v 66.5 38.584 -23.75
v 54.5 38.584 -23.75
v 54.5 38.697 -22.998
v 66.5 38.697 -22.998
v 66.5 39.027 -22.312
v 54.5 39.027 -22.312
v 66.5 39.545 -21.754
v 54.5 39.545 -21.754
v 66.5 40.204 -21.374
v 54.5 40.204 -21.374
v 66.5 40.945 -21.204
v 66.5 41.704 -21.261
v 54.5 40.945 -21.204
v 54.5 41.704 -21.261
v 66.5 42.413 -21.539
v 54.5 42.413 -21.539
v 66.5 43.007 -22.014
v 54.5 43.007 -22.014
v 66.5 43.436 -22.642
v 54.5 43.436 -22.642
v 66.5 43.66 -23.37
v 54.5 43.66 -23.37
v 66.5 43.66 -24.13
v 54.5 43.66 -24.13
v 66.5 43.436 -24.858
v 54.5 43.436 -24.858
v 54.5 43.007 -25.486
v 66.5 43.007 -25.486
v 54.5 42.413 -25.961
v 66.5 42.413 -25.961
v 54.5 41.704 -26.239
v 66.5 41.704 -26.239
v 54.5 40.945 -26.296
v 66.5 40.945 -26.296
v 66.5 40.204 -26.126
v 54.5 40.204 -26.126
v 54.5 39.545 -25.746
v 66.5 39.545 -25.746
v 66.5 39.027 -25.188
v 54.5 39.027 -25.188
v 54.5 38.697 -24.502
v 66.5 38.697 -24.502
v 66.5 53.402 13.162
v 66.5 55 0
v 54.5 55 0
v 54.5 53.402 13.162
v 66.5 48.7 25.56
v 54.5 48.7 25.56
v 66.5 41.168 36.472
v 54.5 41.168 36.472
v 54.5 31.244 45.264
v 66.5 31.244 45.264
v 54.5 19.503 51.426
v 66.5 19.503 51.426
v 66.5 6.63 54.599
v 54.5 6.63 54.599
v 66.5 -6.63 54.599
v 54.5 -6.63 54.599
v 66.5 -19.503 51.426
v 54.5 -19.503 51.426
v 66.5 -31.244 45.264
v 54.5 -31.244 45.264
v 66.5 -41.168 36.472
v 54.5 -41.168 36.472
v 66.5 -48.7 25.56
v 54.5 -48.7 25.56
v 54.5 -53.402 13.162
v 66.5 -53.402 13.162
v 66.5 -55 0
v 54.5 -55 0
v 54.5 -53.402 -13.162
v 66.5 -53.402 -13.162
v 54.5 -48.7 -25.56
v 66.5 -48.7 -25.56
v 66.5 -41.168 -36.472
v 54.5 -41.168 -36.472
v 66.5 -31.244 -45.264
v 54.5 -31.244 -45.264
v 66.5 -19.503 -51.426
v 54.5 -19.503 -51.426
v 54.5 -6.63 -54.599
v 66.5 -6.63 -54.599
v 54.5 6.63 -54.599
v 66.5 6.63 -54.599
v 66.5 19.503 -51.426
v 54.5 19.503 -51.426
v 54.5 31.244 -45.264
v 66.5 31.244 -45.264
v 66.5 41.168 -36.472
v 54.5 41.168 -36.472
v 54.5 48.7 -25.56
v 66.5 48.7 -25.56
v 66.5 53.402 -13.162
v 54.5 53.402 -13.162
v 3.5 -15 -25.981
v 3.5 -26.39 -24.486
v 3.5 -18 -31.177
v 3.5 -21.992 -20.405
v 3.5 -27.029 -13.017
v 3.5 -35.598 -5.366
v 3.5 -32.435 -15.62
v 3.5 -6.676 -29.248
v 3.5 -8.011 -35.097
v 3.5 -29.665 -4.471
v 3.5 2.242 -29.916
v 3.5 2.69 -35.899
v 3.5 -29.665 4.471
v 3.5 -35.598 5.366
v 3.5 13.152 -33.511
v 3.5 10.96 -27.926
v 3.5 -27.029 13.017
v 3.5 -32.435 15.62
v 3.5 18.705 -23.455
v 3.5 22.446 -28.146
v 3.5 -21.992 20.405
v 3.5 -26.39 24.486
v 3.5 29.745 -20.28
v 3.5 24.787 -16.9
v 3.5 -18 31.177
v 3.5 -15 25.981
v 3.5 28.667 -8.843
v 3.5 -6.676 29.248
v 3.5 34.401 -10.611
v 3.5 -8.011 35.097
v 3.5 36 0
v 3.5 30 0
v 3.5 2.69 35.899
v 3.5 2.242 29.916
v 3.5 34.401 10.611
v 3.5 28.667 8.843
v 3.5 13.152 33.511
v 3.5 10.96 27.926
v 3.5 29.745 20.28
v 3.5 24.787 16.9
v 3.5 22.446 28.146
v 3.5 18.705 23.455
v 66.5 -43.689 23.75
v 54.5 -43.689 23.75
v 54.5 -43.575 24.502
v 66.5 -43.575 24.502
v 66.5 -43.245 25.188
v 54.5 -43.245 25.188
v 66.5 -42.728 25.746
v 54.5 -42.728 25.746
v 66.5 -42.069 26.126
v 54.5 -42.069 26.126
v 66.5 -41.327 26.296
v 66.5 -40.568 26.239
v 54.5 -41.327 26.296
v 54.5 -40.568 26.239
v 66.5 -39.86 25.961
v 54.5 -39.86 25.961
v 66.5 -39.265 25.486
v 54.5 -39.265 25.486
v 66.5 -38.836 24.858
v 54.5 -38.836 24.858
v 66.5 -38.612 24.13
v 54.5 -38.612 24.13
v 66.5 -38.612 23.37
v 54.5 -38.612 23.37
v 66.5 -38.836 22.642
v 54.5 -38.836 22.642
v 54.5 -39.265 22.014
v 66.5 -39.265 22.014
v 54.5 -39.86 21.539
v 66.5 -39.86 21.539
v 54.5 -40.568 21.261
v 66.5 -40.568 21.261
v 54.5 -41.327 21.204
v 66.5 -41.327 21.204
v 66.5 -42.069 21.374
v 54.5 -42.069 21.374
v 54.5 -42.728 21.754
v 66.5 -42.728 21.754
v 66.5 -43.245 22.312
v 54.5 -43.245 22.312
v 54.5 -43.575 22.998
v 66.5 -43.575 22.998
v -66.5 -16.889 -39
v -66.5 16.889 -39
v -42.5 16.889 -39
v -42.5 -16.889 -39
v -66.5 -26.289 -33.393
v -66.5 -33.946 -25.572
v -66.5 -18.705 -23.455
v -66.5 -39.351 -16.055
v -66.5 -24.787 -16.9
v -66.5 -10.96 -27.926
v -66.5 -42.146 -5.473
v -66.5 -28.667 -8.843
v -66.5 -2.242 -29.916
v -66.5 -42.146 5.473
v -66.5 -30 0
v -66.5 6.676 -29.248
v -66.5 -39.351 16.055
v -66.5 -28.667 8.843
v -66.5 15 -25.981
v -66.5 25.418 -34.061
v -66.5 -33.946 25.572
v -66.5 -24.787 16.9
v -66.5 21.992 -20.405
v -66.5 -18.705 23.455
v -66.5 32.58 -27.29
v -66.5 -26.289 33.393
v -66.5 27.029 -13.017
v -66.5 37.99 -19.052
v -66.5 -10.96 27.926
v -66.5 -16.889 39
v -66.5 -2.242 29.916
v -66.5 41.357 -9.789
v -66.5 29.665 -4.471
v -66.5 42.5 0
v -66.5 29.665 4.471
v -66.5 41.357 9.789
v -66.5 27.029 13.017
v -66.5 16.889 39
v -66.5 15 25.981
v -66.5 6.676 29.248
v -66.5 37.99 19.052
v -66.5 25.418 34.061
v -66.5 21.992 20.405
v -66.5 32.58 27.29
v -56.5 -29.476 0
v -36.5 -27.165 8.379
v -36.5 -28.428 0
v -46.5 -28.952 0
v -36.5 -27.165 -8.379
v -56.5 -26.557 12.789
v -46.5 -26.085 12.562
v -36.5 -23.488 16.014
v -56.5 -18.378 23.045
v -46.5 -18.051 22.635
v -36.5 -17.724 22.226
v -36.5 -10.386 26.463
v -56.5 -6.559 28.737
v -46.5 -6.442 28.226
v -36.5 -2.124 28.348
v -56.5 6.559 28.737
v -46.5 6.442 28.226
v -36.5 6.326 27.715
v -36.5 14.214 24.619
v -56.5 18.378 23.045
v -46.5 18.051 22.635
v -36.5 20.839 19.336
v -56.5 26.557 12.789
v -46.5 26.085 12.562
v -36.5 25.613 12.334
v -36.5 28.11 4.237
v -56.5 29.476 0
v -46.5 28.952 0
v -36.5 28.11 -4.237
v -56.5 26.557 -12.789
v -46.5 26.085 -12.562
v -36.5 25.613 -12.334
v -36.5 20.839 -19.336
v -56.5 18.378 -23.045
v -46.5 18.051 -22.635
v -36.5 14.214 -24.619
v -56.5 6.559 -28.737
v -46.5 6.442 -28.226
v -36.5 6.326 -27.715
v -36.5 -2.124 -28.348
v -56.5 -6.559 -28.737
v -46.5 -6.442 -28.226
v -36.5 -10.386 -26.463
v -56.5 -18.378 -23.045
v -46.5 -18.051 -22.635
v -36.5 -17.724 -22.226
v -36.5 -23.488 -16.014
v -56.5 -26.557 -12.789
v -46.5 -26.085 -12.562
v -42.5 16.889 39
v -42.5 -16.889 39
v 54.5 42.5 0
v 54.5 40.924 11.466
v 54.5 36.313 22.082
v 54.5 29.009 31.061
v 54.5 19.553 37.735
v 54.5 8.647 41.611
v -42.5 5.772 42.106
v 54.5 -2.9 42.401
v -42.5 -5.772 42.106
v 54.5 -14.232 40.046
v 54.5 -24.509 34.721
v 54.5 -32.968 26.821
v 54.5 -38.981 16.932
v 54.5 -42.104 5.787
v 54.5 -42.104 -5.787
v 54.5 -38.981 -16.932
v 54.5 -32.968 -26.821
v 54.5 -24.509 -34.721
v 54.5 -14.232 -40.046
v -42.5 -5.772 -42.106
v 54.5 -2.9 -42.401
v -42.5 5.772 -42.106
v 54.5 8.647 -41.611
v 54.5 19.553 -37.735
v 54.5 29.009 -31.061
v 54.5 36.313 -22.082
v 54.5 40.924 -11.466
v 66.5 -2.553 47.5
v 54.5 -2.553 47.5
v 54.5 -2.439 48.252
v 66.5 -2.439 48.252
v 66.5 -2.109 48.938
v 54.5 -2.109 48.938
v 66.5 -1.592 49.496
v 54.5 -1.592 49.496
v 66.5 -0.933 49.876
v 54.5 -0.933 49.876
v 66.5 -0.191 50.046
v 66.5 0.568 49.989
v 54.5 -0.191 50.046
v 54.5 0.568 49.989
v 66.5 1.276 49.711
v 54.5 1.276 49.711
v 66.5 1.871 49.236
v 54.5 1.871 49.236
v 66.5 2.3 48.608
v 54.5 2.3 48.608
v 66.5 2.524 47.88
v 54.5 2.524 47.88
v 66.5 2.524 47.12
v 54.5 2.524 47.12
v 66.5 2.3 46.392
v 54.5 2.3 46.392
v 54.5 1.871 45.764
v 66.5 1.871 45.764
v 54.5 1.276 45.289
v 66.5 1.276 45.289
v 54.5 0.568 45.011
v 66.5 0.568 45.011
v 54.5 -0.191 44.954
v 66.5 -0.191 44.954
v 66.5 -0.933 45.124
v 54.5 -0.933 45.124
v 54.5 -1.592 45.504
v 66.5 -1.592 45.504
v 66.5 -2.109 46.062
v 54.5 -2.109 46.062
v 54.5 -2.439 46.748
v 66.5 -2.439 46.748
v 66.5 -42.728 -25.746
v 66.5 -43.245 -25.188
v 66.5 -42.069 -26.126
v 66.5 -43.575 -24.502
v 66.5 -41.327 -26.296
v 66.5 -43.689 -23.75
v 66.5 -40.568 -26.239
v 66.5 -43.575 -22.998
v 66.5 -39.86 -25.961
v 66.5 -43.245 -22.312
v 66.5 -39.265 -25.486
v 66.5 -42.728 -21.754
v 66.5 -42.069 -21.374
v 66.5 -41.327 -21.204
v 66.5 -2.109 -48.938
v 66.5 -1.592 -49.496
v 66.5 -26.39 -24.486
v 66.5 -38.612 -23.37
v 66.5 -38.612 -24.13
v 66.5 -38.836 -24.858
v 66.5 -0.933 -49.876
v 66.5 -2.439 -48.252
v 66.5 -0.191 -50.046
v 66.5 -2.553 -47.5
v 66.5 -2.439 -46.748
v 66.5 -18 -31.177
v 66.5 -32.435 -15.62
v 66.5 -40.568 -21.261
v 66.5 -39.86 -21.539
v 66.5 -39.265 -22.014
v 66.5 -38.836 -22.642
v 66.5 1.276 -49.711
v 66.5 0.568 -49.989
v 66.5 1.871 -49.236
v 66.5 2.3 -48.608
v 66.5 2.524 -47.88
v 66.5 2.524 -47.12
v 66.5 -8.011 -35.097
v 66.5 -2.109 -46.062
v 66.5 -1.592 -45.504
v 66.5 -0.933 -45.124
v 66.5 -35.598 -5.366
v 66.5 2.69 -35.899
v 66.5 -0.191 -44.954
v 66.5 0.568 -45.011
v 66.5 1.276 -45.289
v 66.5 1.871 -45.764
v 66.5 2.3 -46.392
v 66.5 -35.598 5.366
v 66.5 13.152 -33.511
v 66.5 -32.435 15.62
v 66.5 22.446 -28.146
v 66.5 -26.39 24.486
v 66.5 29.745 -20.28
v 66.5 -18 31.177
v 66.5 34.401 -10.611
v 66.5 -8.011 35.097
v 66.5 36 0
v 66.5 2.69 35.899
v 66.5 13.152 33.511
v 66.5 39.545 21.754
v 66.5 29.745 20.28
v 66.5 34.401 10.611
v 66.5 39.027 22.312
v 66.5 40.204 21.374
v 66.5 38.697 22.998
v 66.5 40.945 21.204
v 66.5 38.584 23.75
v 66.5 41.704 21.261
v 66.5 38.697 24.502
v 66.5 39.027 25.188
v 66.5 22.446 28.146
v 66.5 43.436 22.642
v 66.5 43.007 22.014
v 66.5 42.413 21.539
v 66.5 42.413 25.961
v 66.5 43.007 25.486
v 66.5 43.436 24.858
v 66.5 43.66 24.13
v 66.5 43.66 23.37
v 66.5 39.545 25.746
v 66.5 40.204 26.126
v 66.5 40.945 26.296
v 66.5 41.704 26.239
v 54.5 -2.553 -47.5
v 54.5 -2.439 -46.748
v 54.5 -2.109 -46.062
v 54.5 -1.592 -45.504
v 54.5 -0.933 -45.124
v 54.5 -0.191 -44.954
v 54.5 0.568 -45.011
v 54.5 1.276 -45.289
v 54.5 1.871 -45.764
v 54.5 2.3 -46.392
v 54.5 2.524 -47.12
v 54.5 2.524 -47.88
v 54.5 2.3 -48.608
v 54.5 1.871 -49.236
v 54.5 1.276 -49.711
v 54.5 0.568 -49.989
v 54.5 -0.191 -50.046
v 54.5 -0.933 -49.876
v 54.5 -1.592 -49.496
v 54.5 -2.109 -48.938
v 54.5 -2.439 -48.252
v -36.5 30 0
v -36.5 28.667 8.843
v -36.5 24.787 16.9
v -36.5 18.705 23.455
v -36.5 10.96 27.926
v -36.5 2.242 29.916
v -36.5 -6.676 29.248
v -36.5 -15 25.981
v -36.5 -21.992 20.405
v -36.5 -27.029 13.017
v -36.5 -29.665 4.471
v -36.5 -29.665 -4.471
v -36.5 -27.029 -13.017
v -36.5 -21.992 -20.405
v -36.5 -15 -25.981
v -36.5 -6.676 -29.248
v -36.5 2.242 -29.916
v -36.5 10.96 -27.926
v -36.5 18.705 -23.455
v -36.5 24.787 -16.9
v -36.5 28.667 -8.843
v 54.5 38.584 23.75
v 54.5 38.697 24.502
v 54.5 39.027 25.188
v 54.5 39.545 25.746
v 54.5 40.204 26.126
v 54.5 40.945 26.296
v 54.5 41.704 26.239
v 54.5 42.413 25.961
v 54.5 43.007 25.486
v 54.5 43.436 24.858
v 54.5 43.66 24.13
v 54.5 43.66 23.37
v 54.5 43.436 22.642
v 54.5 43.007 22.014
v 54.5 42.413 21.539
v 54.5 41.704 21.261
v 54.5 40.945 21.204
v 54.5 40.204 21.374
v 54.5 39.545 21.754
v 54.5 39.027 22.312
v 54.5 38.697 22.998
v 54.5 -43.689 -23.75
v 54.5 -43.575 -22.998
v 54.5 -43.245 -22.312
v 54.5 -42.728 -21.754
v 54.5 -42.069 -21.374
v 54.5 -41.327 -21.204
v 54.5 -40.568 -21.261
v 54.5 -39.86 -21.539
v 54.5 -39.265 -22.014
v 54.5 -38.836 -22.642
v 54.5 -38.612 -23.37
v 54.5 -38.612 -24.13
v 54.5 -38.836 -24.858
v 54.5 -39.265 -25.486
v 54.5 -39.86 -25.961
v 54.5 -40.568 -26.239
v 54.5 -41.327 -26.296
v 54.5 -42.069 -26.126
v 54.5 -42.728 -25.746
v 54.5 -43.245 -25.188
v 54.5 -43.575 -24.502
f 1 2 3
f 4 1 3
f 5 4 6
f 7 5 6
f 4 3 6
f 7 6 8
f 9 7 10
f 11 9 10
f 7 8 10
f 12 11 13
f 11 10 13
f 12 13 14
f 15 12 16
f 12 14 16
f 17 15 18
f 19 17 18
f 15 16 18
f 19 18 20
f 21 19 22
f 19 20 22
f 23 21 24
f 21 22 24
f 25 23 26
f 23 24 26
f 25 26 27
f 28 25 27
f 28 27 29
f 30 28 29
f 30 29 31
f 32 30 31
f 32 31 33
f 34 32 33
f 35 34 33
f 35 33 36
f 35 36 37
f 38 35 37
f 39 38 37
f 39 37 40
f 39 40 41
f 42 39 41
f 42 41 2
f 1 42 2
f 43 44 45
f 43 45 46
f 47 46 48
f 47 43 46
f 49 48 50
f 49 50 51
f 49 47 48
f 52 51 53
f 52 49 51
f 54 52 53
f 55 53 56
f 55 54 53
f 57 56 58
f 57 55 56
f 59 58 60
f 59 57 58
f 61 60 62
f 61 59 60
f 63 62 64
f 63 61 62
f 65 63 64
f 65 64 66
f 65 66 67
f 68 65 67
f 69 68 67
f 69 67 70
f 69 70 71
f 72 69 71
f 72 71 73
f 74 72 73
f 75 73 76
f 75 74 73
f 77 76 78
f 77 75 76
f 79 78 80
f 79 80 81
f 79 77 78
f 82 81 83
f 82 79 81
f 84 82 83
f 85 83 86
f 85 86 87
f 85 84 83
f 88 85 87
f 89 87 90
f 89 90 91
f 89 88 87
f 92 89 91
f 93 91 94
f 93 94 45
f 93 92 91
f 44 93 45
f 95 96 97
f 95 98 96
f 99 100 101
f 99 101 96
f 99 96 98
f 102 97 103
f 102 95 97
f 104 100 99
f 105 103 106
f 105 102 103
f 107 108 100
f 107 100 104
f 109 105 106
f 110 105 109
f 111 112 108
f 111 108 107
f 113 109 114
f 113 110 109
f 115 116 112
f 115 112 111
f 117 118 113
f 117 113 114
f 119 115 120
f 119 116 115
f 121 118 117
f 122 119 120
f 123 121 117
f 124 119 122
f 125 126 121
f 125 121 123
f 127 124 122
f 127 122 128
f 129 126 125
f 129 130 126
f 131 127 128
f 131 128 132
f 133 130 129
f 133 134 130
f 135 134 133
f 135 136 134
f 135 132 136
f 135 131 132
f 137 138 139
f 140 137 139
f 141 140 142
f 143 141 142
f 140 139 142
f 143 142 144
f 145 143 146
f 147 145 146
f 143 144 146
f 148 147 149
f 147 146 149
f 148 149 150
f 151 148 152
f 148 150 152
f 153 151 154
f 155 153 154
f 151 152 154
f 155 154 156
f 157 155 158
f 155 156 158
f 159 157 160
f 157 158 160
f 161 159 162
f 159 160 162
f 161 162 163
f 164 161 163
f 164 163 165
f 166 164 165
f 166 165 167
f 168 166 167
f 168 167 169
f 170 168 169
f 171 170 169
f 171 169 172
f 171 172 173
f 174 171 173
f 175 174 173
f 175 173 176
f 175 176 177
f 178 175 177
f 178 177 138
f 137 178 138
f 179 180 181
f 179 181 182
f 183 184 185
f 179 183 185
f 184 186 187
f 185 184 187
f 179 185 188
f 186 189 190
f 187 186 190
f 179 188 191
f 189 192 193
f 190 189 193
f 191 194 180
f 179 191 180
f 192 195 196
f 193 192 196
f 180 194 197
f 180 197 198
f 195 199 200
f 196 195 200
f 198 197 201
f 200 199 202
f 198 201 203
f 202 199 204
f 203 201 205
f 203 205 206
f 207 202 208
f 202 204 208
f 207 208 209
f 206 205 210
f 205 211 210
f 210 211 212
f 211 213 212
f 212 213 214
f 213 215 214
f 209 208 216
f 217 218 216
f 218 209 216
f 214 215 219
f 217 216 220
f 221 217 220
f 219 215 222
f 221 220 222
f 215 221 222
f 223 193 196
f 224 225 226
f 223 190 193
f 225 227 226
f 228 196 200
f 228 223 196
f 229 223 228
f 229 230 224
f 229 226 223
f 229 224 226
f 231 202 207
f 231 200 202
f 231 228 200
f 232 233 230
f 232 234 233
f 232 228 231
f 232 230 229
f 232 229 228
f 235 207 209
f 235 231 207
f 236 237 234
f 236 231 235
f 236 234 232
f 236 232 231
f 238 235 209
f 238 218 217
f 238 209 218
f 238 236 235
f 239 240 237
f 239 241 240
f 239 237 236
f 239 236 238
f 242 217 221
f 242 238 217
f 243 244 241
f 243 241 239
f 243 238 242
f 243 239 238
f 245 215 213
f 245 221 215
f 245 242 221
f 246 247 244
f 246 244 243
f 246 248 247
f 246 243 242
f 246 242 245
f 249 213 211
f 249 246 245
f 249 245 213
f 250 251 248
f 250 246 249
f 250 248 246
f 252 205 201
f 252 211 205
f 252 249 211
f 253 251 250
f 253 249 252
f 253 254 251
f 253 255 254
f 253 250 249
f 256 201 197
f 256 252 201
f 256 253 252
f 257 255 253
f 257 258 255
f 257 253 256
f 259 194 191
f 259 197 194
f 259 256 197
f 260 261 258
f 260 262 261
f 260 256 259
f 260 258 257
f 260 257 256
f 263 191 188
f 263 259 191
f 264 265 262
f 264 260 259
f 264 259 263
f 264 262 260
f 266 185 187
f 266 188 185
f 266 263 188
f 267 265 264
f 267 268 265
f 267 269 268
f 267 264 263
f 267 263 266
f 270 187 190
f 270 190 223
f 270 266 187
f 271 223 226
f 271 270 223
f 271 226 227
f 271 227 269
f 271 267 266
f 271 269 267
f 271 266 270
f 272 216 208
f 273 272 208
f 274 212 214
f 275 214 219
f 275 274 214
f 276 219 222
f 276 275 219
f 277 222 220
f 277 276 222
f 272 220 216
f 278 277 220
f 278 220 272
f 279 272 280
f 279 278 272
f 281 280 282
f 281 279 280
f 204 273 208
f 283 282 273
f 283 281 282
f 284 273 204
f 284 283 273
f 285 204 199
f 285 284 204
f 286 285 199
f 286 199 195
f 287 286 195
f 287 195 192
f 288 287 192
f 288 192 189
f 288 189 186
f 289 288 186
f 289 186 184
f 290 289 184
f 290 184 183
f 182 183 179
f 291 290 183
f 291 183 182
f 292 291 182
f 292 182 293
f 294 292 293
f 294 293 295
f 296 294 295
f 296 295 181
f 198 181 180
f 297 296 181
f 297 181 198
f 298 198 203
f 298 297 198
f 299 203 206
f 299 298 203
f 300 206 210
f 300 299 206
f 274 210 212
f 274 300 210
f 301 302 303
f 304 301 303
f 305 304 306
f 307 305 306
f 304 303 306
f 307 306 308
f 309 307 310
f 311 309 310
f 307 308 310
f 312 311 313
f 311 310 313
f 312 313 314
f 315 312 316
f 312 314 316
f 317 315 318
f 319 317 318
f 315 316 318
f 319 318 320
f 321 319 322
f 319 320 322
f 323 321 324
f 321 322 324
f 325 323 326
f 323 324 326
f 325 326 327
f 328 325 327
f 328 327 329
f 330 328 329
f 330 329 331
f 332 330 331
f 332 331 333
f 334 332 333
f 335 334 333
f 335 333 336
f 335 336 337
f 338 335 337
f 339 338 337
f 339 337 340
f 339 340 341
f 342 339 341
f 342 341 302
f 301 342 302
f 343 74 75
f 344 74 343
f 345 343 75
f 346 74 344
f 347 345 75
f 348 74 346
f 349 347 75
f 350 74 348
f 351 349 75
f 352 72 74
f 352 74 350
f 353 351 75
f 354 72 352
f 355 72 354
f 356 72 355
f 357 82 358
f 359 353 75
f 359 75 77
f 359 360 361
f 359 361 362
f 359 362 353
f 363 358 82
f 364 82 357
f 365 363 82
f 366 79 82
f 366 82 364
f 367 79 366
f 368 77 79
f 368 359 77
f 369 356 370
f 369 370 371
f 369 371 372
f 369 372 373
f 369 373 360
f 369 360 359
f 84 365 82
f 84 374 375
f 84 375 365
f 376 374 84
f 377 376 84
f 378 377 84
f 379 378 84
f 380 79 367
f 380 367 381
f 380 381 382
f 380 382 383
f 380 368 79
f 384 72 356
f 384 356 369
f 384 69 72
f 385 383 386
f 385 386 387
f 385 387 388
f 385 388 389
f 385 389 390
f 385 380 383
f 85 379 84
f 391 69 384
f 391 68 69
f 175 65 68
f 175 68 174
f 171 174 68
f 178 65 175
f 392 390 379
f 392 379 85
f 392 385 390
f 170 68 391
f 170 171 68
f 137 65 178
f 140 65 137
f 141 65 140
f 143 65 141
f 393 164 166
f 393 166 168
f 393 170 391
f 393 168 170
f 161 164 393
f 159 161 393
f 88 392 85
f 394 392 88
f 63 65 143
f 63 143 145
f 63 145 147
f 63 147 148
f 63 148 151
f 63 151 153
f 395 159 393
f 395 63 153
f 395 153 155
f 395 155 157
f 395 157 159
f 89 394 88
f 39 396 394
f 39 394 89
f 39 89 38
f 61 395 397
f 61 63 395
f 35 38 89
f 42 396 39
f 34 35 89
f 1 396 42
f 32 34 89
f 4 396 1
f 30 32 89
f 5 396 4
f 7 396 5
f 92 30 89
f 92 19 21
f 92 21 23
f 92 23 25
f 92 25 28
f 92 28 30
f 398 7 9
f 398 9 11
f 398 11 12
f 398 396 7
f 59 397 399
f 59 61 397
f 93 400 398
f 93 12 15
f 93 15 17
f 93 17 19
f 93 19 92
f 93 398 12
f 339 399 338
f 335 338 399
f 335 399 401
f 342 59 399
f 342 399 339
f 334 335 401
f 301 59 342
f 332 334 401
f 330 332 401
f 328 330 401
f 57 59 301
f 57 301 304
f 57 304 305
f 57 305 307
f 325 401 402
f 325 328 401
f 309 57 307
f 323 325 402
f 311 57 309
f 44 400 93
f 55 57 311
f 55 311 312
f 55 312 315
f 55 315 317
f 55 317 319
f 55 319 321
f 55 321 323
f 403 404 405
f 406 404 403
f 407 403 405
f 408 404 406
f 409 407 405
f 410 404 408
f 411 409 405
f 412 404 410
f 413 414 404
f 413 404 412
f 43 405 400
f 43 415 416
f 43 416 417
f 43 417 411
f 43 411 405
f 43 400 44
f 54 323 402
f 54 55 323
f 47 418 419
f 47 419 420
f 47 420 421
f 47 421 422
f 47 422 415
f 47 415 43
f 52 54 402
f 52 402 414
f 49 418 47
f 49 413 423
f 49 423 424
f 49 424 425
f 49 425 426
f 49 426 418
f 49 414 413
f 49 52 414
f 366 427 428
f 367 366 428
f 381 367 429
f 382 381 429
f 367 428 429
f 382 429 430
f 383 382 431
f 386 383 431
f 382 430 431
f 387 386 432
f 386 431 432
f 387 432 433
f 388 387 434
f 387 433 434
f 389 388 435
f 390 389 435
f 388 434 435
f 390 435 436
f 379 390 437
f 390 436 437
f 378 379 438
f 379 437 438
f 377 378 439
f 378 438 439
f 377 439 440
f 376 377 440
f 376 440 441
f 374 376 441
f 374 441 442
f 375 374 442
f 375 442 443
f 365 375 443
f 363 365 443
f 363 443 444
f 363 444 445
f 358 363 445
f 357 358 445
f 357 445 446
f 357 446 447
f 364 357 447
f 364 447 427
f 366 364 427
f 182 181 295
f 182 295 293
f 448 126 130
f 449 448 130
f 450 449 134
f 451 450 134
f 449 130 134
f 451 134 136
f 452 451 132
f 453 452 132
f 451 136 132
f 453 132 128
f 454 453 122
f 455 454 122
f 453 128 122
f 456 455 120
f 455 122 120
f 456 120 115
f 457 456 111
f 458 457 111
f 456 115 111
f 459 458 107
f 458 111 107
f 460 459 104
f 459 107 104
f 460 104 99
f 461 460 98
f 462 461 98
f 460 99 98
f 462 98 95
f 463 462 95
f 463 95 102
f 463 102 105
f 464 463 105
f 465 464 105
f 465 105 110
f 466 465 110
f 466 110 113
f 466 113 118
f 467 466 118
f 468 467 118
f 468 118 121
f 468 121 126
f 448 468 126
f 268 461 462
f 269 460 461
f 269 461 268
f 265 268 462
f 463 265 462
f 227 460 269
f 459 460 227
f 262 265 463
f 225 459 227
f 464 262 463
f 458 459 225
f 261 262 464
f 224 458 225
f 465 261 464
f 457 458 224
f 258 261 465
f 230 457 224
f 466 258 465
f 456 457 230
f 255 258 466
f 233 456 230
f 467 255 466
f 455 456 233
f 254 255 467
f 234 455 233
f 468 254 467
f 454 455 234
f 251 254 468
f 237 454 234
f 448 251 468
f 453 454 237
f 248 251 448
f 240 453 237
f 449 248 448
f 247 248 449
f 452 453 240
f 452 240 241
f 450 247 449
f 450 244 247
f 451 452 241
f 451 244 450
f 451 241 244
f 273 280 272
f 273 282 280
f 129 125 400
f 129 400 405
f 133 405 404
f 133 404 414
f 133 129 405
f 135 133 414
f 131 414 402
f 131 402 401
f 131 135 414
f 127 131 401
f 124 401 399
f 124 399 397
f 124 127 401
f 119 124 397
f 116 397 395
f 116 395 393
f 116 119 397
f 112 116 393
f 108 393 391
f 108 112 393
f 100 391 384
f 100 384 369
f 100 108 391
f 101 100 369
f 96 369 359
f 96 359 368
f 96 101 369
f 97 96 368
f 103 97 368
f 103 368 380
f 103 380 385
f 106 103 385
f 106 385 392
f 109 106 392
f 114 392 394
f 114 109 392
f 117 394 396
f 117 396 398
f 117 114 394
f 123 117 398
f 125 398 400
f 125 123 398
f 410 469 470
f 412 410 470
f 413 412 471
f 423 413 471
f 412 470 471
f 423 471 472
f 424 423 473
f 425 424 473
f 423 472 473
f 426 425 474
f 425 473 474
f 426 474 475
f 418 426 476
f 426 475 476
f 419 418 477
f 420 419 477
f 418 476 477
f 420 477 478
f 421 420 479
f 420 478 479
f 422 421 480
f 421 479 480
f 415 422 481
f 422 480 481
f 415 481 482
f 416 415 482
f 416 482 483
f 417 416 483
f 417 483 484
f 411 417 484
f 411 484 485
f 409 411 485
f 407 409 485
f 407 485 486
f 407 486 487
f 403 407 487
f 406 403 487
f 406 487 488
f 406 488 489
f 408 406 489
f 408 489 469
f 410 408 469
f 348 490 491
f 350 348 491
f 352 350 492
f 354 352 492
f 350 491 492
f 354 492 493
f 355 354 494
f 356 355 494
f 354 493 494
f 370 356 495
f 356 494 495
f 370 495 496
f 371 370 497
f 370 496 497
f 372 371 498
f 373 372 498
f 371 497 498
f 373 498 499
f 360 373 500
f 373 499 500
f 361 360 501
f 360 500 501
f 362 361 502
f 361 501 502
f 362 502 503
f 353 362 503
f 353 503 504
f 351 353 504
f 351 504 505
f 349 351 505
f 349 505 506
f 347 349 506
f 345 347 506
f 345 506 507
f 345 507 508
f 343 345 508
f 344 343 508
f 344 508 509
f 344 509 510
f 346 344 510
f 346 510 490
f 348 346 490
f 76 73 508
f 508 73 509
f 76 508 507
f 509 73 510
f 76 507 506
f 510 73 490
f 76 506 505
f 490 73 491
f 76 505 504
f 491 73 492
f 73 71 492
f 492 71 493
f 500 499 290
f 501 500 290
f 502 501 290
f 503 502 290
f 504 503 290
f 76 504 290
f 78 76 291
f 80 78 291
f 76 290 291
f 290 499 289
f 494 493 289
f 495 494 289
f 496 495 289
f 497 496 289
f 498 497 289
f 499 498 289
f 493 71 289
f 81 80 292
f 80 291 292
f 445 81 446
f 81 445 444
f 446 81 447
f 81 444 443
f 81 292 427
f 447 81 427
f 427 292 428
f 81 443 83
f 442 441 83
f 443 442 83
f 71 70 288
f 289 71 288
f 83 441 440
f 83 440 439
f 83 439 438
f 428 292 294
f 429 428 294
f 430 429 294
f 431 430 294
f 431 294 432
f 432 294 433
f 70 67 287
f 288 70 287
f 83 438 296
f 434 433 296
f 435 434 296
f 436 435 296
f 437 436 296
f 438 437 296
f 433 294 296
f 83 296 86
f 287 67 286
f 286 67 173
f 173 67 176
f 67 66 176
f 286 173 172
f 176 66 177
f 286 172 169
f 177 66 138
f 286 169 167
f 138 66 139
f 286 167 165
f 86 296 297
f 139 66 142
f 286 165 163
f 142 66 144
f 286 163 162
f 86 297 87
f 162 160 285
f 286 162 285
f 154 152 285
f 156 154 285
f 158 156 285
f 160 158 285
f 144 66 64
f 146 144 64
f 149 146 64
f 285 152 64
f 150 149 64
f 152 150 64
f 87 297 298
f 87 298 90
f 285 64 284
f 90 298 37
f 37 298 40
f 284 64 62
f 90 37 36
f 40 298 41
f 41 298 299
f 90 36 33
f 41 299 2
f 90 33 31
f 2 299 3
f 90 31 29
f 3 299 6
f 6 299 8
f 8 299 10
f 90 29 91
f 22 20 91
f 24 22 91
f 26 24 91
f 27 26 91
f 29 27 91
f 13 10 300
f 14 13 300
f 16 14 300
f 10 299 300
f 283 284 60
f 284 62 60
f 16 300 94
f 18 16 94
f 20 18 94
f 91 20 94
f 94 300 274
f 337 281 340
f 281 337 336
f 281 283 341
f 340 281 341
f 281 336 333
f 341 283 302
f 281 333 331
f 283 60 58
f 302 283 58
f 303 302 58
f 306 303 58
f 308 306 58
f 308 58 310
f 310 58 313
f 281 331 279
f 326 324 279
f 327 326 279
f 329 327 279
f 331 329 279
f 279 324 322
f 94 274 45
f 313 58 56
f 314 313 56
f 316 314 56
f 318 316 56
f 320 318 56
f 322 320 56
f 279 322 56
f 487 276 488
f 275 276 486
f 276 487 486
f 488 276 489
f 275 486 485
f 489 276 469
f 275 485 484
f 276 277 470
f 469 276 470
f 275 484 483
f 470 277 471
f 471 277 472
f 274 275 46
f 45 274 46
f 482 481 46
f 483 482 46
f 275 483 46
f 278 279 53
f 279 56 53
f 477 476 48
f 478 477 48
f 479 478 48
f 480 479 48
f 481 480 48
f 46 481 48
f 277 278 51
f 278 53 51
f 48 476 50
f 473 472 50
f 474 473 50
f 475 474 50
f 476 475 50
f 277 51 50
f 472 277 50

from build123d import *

# Parameters (mm, degrees)
F0_R      = 42.5
F1_DEPTH  = 66.5
F2_R      = 55
F3_DEPTH  = 12
F5_D      = 5.1054
F6_R      = 30
F7_DEPTH  = 30
F7_TAPER  = 3
F8_R      = 30
F9_DEPTH  = 103
F11_R     = 36
F12_DEPTH = 63
F13_W     = 105.4392717779
F13_H     = 18.3104768991
F14_DEPTH = 24


with BuildPart() as f1:
    # F0 (on Right) → F1 (new body, symmetric)
    with BuildSketch(Plane.YZ):
        Circle(F0_R)
    extrude(amount=F1_DEPTH, both=True)

    # F2 (on face) → F3 (join)
    with BuildSketch(Plane.YZ.offset(66.5)):
        Circle(F2_R)
    extrude(amount=-F3_DEPTH)

    # F5 (through all)
    with Locations(Plane.YZ.offset(66.5)):
        with Locations((0, 47.5), (-41.1362066798, 23.75), (-41.1362066798, -23.75), (0, -47.5), (41.1362066798, -23.75), (41.1362066798, 23.75)):
            Hole(F5_D / 2)

    # F6 (on face) → F7 (cut)
    with BuildSketch(Plane(origin=(-66.5, 0, 0), x_dir=(0, -1, 0), z_dir=(-1, 0, 0))):
        Circle(F6_R)
    extrude(amount=-F7_DEPTH, taper=F7_TAPER, mode=Mode.SUBTRACT)

    # F8 (on face) → F9 (cut, through all)
    with BuildSketch(Plane.YZ.offset(66.5)):
        Circle(F8_R)
    extrude(amount=-F9_DEPTH, mode=Mode.SUBTRACT)

    # F11 (on offset) → F12 (cut, through all)
    with BuildSketch(Plane.YZ.offset(3.5)):
        Circle(F11_R)
    extrude(amount=F12_DEPTH, mode=Mode.SUBTRACT)

    # F13 (on face) → F14 (cut)
    with BuildSketch(Plane(origin=(-66.5, 0, 0), x_dir=(0, -1, 0), z_dir=(-1, 0, 0))):
        with Locations((-0.2345982939, 48.1552384496)):
            Rectangle(F13_W, F13_H)
        with Locations((-0.2345982939, -48.1552384496)):
            Rectangle(F13_W, F13_H)
    extrude(amount=-F14_DEPTH, mode=Mode.SUBTRACT)


solid = f1.part
